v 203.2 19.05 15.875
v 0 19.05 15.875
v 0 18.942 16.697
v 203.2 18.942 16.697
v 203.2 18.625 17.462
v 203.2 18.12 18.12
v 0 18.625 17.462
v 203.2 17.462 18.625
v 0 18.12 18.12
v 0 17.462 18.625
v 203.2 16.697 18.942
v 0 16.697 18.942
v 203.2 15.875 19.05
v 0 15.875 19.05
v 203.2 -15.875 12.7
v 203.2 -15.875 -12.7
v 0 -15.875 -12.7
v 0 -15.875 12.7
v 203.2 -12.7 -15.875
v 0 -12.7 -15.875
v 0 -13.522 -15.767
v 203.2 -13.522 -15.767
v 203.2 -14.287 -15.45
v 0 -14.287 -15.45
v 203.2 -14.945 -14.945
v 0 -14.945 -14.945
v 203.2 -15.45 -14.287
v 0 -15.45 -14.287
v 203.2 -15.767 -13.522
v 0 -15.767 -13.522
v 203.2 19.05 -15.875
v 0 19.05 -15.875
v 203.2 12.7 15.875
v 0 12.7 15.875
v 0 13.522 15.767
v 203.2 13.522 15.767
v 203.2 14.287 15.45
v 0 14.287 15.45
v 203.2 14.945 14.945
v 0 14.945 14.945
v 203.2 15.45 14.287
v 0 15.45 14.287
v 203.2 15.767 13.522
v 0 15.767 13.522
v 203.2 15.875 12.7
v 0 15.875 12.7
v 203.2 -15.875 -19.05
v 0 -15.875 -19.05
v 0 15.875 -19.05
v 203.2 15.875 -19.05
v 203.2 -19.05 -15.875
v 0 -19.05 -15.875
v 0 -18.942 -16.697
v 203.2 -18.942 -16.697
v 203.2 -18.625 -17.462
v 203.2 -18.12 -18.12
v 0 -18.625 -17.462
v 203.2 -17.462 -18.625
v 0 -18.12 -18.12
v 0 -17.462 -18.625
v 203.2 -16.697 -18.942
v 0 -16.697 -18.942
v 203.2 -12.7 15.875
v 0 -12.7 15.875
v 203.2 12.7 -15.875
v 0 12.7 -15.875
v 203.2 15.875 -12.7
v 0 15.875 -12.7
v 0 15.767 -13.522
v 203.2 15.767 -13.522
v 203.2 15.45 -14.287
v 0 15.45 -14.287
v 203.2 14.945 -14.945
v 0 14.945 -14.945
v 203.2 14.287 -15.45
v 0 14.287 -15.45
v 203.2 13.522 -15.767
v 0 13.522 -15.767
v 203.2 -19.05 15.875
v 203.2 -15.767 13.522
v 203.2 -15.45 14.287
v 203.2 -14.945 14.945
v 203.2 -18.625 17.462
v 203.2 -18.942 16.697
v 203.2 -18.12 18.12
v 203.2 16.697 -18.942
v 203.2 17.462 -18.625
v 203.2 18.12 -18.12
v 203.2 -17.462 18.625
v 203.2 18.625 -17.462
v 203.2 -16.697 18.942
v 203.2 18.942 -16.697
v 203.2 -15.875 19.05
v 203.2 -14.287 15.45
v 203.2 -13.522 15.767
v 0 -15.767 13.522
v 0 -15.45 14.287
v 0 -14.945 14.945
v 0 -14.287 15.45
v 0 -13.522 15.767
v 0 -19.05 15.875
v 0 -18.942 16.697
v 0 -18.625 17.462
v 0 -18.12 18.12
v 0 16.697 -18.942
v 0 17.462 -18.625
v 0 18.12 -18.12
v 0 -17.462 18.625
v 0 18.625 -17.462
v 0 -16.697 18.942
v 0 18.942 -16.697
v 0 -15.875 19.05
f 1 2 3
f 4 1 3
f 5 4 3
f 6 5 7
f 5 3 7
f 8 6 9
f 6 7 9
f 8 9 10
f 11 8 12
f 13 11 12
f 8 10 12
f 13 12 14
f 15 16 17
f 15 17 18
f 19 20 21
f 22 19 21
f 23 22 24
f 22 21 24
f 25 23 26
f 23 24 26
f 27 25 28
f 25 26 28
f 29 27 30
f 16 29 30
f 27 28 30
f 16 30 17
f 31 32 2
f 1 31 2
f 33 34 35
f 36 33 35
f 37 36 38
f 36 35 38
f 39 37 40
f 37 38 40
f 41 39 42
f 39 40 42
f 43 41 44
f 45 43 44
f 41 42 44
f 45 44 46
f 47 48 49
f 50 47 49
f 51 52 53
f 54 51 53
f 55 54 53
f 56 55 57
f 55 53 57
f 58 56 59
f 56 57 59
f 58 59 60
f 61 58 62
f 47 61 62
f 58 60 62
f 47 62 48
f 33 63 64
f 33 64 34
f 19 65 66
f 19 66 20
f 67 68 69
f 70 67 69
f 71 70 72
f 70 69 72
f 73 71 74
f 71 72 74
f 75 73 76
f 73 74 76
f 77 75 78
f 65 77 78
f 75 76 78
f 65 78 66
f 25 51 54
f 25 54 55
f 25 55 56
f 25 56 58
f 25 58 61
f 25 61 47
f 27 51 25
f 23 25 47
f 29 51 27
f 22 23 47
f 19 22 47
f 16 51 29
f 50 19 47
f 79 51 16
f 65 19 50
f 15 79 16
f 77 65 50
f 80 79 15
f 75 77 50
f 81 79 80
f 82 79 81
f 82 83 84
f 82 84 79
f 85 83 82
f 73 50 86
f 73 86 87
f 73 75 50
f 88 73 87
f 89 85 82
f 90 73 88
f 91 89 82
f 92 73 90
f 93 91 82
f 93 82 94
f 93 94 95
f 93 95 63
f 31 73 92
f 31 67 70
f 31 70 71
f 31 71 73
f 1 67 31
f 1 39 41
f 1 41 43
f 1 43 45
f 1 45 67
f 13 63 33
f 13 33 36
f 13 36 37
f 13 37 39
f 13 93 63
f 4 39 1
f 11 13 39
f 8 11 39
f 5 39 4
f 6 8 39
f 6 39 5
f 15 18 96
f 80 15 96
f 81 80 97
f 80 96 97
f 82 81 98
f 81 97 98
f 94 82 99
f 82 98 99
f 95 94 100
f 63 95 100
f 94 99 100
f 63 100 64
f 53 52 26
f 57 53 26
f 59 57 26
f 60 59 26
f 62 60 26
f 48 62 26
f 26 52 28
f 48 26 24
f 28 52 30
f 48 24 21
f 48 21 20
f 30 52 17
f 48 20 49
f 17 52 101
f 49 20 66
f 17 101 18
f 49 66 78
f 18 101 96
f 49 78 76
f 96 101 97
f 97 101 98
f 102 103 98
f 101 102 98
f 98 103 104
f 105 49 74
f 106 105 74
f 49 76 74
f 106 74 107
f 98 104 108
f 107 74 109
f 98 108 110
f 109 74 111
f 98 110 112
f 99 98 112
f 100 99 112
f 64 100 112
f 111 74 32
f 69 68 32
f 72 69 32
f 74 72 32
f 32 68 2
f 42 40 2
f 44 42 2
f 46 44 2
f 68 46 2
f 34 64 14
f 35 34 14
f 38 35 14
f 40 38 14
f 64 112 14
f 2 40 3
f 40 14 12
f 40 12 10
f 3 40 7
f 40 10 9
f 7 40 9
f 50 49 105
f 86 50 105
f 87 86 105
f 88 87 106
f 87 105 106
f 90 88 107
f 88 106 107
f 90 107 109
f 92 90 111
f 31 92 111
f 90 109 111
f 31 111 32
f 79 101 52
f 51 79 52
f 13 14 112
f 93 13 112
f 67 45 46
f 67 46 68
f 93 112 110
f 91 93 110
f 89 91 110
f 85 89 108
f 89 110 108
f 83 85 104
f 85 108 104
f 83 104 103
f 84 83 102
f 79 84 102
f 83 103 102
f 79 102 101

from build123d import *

# Parameters (mm, degrees)
F1_DEPTH = 203.2


with BuildPart() as f1:
    # F0 (on Right) → F1 (new body)
    with BuildSketch(Plane.YZ):
        with BuildLine():
            ThreePointArc((19.05, 15.875), (18.120064, 18.120064), (15.875, 19.05))
            Line((15.875, 19.05), (-15.875, 19.05))
            ThreePointArc((-15.875, 19.05), (-18.120064, 18.120064), (-19.05, 15.875))
            Line((-19.05, 15.875), (-19.05, -15.875))
            ThreePointArc((-19.05, -15.875), (-18.120064, -18.120064), (-15.875, -19.05))
            Line((-15.875, -19.05), (15.875, -19.05))
            ThreePointArc((15.875, -19.05), (18.120064, -18.120064), (19.05, -15.875))
            Line((19.05, -15.875), (19.05, 15.875))
        make_face()
        with BuildLine():
            Line((-12.7, 15.875), (12.7, 15.875))
            ThreePointArc((12.7, 15.875), (14.945064, 14.945064), (15.875, 12.7))
            Line((15.875, 12.7), (15.875, -12.7))
            ThreePointArc((15.875, -12.7), (14.945064, -14.945064), (12.7, -15.875))
            Line((12.7, -15.875), (-12.7, -15.875))
            ThreePointArc((-12.7, -15.875), (-14.945064, -14.945064), (-15.875, -12.7))
            Line((-15.875, -12.7), (-15.875, 12.7))
            ThreePointArc((-15.875, 12.7), (-14.945064, 14.945064), (-12.7, 15.875))
        make_face(mode=Mode.SUBTRACT)
    extrude(amount=F1_DEPTH)


solid = f1.part
